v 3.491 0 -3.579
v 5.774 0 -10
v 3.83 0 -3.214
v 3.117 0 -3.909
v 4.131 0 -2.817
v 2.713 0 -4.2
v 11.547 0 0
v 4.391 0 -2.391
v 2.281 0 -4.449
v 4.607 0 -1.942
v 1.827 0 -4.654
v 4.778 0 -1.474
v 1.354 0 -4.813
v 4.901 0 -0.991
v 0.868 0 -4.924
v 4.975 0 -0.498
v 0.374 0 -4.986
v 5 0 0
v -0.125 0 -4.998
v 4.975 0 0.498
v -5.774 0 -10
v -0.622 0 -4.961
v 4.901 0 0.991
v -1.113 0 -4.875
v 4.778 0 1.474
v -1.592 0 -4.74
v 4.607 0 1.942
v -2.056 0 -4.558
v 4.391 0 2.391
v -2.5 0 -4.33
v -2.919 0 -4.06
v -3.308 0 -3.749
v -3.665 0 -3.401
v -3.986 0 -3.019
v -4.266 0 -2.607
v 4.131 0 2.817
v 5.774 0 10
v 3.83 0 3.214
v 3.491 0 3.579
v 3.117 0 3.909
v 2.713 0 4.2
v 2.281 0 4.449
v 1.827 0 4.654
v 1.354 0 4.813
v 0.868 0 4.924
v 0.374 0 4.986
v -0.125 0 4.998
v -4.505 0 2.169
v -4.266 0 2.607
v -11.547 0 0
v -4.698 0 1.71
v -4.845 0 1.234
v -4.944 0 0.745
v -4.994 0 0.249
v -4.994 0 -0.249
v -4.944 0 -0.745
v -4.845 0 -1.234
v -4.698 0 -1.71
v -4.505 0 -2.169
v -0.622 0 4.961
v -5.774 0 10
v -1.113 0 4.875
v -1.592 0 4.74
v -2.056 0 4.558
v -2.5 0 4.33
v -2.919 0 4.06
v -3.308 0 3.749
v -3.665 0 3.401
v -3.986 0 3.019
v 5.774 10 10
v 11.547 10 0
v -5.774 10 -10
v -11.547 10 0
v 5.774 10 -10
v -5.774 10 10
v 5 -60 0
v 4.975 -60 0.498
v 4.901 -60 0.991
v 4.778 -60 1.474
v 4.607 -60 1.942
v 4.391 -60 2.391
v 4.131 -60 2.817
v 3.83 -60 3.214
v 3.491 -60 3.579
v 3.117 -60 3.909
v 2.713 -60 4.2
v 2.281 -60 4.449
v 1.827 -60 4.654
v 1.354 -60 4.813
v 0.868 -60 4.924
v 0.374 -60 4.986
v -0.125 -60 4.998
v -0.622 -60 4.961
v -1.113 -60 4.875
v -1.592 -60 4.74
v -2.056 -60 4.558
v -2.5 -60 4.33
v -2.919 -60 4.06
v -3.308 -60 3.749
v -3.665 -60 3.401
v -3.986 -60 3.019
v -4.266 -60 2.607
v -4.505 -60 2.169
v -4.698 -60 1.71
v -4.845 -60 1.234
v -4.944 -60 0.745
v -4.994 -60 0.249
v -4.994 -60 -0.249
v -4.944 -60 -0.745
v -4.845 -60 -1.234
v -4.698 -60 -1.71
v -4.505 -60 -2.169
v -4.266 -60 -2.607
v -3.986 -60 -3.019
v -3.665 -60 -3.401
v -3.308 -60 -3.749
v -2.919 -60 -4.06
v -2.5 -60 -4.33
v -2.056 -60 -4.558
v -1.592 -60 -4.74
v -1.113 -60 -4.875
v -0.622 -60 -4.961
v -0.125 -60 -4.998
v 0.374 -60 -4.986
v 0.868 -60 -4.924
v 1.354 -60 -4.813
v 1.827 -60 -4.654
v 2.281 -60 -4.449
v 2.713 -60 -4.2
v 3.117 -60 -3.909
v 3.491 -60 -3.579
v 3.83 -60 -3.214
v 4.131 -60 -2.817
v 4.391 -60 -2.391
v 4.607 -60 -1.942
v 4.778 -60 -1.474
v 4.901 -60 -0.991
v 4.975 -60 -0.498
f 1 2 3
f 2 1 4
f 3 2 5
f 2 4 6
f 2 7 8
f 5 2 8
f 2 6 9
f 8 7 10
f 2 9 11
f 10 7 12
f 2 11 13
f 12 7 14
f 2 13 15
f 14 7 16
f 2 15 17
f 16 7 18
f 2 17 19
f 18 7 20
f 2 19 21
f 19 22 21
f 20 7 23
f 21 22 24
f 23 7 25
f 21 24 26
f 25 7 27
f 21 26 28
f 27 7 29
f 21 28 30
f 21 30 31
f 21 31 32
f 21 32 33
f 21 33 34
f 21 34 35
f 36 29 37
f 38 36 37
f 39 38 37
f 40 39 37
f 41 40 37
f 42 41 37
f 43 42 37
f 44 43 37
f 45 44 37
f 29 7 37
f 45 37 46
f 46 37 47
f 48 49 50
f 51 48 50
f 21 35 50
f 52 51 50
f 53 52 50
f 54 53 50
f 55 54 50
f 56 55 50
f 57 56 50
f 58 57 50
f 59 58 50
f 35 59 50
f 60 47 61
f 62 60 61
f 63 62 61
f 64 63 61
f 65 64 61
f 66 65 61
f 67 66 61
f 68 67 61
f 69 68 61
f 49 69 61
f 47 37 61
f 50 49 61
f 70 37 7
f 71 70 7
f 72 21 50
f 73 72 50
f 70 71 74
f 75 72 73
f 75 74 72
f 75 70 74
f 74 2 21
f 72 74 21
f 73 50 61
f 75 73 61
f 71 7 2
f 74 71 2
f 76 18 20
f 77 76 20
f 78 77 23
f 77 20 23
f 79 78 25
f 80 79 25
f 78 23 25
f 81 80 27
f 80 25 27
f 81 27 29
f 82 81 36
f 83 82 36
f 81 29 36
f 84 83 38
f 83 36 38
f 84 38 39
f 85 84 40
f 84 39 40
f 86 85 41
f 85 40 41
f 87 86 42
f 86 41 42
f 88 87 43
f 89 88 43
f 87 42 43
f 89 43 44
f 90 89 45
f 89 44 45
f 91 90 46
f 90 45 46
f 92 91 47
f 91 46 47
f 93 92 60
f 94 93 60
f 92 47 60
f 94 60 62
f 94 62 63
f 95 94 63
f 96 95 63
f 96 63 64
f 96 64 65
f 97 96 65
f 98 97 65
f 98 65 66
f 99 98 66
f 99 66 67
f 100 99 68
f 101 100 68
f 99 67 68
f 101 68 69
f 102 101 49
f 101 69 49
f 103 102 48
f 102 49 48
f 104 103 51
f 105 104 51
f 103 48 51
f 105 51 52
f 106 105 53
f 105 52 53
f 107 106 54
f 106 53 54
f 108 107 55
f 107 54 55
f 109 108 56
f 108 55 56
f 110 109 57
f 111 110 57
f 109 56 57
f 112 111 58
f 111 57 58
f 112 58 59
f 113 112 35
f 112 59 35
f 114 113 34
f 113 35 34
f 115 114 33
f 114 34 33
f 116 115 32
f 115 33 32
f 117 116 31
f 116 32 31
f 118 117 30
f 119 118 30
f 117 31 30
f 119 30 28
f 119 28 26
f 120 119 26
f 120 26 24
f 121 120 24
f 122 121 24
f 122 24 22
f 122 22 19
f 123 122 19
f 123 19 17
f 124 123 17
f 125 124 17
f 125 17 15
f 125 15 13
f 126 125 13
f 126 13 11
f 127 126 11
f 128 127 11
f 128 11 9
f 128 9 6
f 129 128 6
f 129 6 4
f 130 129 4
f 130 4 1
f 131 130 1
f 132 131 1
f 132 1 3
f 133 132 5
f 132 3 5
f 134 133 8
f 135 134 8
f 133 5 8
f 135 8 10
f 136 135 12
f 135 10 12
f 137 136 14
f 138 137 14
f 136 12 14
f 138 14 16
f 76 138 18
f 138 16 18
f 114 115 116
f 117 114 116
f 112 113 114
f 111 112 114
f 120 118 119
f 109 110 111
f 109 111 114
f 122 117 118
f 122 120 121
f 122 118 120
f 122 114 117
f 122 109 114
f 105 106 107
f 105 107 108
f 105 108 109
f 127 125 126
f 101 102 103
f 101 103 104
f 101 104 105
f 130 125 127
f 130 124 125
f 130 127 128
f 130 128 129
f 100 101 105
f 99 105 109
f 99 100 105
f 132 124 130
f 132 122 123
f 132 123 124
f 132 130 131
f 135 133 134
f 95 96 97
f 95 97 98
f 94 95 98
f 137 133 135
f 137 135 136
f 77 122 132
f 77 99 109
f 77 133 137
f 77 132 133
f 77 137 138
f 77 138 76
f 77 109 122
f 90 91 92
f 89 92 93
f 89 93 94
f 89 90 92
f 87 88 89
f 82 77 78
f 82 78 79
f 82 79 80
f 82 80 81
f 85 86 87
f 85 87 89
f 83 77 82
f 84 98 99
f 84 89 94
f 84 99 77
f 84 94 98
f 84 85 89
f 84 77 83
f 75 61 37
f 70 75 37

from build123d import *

# Parameters (mm, degrees)
F0_R     = 5
F1_DEPTH = 60
F2_R     = 5
F3_DEPTH = 10


with BuildPart() as f1:
    # F0 (on Front) → F1 (new body)
    with BuildSketch(Plane.XZ):
        Circle(F0_R)
    extrude(amount=F1_DEPTH)

    # F2 (on face) → F3 (join)
    with BuildSketch(Plane(origin=(0, 0, 0), x_dir=(-1, 0, 0), z_dir=(0, 1, 0))):
        Polygon((5.7735026919, -10), (11.5470053838, 0), (5.7735026919, 10), (-5.7735026919, 10), (-11.5470053838, 0), (-5.7735026919, -10), align=None)
        Circle(F2_R, mode=Mode.SUBTRACT)
        Circle(F2_R)
    extrude(amount=F3_DEPTH)


solid = f1.part
